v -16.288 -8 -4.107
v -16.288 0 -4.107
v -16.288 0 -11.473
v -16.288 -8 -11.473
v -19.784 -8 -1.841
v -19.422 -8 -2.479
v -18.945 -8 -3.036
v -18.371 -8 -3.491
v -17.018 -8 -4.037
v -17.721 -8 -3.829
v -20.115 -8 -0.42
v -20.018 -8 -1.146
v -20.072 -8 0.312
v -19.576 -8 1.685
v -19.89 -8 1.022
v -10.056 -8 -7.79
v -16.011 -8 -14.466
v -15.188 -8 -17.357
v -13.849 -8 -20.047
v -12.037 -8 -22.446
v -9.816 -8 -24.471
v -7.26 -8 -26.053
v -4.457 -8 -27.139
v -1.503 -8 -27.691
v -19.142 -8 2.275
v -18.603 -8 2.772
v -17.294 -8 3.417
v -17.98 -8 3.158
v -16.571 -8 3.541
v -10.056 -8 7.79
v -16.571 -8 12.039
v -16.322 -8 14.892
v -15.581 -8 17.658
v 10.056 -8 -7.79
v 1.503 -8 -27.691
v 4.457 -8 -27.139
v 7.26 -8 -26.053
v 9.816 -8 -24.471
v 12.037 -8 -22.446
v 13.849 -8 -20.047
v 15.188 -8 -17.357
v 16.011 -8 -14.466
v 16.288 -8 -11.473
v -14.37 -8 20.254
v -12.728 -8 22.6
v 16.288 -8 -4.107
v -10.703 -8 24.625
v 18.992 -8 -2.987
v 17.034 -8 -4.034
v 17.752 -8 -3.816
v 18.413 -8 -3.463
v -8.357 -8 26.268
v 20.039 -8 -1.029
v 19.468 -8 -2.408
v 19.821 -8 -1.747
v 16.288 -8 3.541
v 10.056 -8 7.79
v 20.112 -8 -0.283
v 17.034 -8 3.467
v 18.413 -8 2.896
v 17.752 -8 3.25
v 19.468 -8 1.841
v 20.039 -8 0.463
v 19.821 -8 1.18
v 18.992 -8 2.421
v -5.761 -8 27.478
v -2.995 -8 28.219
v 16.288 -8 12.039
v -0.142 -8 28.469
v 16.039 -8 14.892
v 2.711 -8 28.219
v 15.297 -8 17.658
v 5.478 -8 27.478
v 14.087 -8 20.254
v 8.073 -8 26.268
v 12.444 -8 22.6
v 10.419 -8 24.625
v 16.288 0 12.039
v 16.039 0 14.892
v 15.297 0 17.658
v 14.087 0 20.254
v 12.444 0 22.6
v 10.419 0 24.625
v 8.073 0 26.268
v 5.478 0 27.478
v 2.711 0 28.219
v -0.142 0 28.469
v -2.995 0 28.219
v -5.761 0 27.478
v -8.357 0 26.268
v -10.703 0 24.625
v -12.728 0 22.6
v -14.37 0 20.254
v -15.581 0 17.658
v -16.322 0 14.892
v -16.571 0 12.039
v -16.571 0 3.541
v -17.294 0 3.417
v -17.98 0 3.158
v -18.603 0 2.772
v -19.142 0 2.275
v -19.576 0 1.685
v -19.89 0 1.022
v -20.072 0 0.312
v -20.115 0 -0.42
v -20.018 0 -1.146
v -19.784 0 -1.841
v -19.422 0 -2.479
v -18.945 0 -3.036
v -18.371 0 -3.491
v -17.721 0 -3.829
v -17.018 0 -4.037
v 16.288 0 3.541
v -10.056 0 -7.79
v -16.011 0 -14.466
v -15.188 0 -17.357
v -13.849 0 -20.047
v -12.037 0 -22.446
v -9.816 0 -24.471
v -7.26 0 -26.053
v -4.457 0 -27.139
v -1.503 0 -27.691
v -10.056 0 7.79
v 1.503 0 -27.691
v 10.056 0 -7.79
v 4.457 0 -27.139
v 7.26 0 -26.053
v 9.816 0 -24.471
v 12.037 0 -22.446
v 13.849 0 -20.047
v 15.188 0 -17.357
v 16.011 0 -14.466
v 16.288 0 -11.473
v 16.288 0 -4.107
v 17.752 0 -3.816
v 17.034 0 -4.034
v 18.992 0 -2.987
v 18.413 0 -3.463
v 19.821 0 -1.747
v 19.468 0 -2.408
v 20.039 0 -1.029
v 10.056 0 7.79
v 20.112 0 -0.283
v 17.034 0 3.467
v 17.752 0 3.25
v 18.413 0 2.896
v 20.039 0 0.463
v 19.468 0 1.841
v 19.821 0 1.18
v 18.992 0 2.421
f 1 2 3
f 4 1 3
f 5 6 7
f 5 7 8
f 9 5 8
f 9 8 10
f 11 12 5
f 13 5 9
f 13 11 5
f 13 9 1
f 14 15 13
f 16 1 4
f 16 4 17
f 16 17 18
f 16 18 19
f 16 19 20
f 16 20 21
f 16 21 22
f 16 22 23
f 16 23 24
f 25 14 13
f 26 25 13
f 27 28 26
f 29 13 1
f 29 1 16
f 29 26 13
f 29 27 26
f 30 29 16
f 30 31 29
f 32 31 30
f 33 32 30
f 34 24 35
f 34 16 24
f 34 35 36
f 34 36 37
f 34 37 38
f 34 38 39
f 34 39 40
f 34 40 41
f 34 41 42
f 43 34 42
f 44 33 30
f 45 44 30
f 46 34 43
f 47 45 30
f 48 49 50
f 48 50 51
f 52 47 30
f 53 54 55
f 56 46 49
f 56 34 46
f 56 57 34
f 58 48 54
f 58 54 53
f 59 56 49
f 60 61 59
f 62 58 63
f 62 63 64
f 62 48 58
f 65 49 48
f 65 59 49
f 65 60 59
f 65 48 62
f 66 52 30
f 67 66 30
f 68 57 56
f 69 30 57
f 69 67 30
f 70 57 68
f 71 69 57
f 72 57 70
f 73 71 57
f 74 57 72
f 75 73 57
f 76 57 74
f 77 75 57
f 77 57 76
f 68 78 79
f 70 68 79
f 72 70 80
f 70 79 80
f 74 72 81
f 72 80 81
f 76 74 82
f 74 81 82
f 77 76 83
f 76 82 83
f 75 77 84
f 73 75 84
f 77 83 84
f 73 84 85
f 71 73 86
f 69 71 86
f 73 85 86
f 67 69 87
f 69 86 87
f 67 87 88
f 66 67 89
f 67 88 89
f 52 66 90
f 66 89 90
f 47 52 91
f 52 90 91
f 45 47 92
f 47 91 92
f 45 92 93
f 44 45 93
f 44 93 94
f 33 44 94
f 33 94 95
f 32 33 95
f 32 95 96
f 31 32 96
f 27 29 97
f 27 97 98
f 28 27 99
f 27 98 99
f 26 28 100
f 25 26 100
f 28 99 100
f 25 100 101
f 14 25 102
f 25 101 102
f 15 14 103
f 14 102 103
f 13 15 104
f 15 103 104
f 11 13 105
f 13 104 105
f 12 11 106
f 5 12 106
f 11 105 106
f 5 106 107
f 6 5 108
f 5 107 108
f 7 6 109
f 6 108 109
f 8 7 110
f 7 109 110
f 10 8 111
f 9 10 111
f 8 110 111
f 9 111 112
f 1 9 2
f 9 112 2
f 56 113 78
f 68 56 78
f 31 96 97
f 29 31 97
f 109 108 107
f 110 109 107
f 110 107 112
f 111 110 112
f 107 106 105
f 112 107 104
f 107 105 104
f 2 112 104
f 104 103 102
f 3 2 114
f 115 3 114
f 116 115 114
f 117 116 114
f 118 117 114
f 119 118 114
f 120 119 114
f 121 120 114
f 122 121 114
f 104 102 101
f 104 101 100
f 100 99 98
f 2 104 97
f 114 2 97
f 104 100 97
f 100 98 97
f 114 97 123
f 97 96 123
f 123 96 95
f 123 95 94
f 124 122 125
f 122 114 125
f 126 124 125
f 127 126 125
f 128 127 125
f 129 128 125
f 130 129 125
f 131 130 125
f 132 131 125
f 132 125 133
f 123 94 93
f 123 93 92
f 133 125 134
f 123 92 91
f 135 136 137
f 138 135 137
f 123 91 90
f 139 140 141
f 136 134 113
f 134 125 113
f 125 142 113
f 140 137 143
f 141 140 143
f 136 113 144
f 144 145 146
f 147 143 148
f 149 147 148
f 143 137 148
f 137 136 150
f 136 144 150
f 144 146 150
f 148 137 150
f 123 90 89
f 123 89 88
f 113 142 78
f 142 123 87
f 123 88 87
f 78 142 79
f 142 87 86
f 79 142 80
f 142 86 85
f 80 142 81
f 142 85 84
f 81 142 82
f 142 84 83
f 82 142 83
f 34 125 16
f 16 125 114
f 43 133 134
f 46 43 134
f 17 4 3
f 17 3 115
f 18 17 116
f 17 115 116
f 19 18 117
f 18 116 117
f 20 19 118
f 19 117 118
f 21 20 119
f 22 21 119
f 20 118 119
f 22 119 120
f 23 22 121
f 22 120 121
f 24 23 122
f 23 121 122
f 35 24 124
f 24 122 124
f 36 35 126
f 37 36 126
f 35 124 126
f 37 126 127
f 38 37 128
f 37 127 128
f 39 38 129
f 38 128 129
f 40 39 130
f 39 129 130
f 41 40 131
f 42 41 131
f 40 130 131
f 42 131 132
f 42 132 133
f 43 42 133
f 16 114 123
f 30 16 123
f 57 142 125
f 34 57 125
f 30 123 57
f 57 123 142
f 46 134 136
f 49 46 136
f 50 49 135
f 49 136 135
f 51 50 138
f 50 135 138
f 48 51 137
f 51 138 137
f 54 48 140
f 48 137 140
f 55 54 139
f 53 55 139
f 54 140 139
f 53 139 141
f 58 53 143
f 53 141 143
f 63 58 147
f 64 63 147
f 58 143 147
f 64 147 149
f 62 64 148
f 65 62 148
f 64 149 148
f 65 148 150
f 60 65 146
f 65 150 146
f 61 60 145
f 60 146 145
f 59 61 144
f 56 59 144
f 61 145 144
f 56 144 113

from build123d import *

# Parameters (mm, degrees)
F1_DEPTH = 8


with BuildPart() as f1:
    # F0 (on Front) → F1 (new body)
    with BuildSketch(Plane.XZ):
        Polygon((10.056205, -4.107465), (10.056205, -7.790019), (3.824189, -7.790019), (3.824189, -11.472573), (16.288221, -11.472573), (16.288221, -4.107465), align=None)
        with BuildLine():
            Line((3.824189, -11.472573), (3.824189, -7.790019))
            Line((3.824189, -7.790019), (-3.824189, -7.790019))
            Line((-3.824189, -7.790019), (-3.824189, -11.472573))
            Line((-3.824189, -11.472573), (-16.288221, -11.472573))
            ThreePointArc((-16.288221, -11.472573), (0, -27.760793), (16.288221, -11.472573))
            Line((16.288221, -11.472573), (3.824189, -11.472573))
        make_face()
        with BuildLine():
            Line((10.056205, 3.540918), (10.056205, -4.107465))
            Line((10.056205, -4.107465), (16.288221, -4.107465))
            ThreePointArc((16.288221, -4.107465), (20.112413, -0.283273), (16.288221, 3.540918))
            Line((16.288221, 3.540918), (10.056205, 3.540918))
        make_face()
        Polygon((-3.824189, -11.472573), (-3.824189, -7.790019), (-10.056205, -7.790019), (-10.056205, -4.107465), (-16.288221, -4.107465), (-16.288221, -11.472573), align=None)
        Polygon((10.056205, 7.790019), (10.056205, 3.540918), (16.288221, 3.540918), (16.288221, 12.039119), (3.824189, 12.039119), (3.824189, 7.790019), align=None)
        with BuildLine():
            Line((-16.288221, -4.107465), (-10.056205, -4.107465))
            Line((-10.056205, -4.107465), (-10.056205, 3.540918))
            Line((-10.056205, 3.540918), (-16.571494, 3.540918))
            ThreePointArc((-16.571494, 3.540918), (-20.115035, -0.419761), (-16.288221, -4.107465))
        make_face()
        with BuildLine():
            Line((-3.540916, 7.790019), (3.824189, 7.790019))
            Line((3.824189, 7.790019), (3.824189, 12.039119))
            Line((3.824189, 12.039119), (16.288221, 12.039119))
            ThreePointArc((16.288221, 12.039119), (-0.141636, 28.468977), (-16.571494, 12.039119))
            Line((-16.571494, 12.039119), (-3.540916, 12.039119))
            Line((-3.540916, 12.039119), (-3.540916, 7.790019))
        make_face()
        Polygon((-16.571494, 3.540918), (-10.056205, 3.540918), (-10.056205, 7.790019), (-3.540916, 7.790019), (-3.540916, 12.039119), (-16.571494, 12.039119), align=None)
    extrude(amount=F1_DEPTH)


solid = f1.part
